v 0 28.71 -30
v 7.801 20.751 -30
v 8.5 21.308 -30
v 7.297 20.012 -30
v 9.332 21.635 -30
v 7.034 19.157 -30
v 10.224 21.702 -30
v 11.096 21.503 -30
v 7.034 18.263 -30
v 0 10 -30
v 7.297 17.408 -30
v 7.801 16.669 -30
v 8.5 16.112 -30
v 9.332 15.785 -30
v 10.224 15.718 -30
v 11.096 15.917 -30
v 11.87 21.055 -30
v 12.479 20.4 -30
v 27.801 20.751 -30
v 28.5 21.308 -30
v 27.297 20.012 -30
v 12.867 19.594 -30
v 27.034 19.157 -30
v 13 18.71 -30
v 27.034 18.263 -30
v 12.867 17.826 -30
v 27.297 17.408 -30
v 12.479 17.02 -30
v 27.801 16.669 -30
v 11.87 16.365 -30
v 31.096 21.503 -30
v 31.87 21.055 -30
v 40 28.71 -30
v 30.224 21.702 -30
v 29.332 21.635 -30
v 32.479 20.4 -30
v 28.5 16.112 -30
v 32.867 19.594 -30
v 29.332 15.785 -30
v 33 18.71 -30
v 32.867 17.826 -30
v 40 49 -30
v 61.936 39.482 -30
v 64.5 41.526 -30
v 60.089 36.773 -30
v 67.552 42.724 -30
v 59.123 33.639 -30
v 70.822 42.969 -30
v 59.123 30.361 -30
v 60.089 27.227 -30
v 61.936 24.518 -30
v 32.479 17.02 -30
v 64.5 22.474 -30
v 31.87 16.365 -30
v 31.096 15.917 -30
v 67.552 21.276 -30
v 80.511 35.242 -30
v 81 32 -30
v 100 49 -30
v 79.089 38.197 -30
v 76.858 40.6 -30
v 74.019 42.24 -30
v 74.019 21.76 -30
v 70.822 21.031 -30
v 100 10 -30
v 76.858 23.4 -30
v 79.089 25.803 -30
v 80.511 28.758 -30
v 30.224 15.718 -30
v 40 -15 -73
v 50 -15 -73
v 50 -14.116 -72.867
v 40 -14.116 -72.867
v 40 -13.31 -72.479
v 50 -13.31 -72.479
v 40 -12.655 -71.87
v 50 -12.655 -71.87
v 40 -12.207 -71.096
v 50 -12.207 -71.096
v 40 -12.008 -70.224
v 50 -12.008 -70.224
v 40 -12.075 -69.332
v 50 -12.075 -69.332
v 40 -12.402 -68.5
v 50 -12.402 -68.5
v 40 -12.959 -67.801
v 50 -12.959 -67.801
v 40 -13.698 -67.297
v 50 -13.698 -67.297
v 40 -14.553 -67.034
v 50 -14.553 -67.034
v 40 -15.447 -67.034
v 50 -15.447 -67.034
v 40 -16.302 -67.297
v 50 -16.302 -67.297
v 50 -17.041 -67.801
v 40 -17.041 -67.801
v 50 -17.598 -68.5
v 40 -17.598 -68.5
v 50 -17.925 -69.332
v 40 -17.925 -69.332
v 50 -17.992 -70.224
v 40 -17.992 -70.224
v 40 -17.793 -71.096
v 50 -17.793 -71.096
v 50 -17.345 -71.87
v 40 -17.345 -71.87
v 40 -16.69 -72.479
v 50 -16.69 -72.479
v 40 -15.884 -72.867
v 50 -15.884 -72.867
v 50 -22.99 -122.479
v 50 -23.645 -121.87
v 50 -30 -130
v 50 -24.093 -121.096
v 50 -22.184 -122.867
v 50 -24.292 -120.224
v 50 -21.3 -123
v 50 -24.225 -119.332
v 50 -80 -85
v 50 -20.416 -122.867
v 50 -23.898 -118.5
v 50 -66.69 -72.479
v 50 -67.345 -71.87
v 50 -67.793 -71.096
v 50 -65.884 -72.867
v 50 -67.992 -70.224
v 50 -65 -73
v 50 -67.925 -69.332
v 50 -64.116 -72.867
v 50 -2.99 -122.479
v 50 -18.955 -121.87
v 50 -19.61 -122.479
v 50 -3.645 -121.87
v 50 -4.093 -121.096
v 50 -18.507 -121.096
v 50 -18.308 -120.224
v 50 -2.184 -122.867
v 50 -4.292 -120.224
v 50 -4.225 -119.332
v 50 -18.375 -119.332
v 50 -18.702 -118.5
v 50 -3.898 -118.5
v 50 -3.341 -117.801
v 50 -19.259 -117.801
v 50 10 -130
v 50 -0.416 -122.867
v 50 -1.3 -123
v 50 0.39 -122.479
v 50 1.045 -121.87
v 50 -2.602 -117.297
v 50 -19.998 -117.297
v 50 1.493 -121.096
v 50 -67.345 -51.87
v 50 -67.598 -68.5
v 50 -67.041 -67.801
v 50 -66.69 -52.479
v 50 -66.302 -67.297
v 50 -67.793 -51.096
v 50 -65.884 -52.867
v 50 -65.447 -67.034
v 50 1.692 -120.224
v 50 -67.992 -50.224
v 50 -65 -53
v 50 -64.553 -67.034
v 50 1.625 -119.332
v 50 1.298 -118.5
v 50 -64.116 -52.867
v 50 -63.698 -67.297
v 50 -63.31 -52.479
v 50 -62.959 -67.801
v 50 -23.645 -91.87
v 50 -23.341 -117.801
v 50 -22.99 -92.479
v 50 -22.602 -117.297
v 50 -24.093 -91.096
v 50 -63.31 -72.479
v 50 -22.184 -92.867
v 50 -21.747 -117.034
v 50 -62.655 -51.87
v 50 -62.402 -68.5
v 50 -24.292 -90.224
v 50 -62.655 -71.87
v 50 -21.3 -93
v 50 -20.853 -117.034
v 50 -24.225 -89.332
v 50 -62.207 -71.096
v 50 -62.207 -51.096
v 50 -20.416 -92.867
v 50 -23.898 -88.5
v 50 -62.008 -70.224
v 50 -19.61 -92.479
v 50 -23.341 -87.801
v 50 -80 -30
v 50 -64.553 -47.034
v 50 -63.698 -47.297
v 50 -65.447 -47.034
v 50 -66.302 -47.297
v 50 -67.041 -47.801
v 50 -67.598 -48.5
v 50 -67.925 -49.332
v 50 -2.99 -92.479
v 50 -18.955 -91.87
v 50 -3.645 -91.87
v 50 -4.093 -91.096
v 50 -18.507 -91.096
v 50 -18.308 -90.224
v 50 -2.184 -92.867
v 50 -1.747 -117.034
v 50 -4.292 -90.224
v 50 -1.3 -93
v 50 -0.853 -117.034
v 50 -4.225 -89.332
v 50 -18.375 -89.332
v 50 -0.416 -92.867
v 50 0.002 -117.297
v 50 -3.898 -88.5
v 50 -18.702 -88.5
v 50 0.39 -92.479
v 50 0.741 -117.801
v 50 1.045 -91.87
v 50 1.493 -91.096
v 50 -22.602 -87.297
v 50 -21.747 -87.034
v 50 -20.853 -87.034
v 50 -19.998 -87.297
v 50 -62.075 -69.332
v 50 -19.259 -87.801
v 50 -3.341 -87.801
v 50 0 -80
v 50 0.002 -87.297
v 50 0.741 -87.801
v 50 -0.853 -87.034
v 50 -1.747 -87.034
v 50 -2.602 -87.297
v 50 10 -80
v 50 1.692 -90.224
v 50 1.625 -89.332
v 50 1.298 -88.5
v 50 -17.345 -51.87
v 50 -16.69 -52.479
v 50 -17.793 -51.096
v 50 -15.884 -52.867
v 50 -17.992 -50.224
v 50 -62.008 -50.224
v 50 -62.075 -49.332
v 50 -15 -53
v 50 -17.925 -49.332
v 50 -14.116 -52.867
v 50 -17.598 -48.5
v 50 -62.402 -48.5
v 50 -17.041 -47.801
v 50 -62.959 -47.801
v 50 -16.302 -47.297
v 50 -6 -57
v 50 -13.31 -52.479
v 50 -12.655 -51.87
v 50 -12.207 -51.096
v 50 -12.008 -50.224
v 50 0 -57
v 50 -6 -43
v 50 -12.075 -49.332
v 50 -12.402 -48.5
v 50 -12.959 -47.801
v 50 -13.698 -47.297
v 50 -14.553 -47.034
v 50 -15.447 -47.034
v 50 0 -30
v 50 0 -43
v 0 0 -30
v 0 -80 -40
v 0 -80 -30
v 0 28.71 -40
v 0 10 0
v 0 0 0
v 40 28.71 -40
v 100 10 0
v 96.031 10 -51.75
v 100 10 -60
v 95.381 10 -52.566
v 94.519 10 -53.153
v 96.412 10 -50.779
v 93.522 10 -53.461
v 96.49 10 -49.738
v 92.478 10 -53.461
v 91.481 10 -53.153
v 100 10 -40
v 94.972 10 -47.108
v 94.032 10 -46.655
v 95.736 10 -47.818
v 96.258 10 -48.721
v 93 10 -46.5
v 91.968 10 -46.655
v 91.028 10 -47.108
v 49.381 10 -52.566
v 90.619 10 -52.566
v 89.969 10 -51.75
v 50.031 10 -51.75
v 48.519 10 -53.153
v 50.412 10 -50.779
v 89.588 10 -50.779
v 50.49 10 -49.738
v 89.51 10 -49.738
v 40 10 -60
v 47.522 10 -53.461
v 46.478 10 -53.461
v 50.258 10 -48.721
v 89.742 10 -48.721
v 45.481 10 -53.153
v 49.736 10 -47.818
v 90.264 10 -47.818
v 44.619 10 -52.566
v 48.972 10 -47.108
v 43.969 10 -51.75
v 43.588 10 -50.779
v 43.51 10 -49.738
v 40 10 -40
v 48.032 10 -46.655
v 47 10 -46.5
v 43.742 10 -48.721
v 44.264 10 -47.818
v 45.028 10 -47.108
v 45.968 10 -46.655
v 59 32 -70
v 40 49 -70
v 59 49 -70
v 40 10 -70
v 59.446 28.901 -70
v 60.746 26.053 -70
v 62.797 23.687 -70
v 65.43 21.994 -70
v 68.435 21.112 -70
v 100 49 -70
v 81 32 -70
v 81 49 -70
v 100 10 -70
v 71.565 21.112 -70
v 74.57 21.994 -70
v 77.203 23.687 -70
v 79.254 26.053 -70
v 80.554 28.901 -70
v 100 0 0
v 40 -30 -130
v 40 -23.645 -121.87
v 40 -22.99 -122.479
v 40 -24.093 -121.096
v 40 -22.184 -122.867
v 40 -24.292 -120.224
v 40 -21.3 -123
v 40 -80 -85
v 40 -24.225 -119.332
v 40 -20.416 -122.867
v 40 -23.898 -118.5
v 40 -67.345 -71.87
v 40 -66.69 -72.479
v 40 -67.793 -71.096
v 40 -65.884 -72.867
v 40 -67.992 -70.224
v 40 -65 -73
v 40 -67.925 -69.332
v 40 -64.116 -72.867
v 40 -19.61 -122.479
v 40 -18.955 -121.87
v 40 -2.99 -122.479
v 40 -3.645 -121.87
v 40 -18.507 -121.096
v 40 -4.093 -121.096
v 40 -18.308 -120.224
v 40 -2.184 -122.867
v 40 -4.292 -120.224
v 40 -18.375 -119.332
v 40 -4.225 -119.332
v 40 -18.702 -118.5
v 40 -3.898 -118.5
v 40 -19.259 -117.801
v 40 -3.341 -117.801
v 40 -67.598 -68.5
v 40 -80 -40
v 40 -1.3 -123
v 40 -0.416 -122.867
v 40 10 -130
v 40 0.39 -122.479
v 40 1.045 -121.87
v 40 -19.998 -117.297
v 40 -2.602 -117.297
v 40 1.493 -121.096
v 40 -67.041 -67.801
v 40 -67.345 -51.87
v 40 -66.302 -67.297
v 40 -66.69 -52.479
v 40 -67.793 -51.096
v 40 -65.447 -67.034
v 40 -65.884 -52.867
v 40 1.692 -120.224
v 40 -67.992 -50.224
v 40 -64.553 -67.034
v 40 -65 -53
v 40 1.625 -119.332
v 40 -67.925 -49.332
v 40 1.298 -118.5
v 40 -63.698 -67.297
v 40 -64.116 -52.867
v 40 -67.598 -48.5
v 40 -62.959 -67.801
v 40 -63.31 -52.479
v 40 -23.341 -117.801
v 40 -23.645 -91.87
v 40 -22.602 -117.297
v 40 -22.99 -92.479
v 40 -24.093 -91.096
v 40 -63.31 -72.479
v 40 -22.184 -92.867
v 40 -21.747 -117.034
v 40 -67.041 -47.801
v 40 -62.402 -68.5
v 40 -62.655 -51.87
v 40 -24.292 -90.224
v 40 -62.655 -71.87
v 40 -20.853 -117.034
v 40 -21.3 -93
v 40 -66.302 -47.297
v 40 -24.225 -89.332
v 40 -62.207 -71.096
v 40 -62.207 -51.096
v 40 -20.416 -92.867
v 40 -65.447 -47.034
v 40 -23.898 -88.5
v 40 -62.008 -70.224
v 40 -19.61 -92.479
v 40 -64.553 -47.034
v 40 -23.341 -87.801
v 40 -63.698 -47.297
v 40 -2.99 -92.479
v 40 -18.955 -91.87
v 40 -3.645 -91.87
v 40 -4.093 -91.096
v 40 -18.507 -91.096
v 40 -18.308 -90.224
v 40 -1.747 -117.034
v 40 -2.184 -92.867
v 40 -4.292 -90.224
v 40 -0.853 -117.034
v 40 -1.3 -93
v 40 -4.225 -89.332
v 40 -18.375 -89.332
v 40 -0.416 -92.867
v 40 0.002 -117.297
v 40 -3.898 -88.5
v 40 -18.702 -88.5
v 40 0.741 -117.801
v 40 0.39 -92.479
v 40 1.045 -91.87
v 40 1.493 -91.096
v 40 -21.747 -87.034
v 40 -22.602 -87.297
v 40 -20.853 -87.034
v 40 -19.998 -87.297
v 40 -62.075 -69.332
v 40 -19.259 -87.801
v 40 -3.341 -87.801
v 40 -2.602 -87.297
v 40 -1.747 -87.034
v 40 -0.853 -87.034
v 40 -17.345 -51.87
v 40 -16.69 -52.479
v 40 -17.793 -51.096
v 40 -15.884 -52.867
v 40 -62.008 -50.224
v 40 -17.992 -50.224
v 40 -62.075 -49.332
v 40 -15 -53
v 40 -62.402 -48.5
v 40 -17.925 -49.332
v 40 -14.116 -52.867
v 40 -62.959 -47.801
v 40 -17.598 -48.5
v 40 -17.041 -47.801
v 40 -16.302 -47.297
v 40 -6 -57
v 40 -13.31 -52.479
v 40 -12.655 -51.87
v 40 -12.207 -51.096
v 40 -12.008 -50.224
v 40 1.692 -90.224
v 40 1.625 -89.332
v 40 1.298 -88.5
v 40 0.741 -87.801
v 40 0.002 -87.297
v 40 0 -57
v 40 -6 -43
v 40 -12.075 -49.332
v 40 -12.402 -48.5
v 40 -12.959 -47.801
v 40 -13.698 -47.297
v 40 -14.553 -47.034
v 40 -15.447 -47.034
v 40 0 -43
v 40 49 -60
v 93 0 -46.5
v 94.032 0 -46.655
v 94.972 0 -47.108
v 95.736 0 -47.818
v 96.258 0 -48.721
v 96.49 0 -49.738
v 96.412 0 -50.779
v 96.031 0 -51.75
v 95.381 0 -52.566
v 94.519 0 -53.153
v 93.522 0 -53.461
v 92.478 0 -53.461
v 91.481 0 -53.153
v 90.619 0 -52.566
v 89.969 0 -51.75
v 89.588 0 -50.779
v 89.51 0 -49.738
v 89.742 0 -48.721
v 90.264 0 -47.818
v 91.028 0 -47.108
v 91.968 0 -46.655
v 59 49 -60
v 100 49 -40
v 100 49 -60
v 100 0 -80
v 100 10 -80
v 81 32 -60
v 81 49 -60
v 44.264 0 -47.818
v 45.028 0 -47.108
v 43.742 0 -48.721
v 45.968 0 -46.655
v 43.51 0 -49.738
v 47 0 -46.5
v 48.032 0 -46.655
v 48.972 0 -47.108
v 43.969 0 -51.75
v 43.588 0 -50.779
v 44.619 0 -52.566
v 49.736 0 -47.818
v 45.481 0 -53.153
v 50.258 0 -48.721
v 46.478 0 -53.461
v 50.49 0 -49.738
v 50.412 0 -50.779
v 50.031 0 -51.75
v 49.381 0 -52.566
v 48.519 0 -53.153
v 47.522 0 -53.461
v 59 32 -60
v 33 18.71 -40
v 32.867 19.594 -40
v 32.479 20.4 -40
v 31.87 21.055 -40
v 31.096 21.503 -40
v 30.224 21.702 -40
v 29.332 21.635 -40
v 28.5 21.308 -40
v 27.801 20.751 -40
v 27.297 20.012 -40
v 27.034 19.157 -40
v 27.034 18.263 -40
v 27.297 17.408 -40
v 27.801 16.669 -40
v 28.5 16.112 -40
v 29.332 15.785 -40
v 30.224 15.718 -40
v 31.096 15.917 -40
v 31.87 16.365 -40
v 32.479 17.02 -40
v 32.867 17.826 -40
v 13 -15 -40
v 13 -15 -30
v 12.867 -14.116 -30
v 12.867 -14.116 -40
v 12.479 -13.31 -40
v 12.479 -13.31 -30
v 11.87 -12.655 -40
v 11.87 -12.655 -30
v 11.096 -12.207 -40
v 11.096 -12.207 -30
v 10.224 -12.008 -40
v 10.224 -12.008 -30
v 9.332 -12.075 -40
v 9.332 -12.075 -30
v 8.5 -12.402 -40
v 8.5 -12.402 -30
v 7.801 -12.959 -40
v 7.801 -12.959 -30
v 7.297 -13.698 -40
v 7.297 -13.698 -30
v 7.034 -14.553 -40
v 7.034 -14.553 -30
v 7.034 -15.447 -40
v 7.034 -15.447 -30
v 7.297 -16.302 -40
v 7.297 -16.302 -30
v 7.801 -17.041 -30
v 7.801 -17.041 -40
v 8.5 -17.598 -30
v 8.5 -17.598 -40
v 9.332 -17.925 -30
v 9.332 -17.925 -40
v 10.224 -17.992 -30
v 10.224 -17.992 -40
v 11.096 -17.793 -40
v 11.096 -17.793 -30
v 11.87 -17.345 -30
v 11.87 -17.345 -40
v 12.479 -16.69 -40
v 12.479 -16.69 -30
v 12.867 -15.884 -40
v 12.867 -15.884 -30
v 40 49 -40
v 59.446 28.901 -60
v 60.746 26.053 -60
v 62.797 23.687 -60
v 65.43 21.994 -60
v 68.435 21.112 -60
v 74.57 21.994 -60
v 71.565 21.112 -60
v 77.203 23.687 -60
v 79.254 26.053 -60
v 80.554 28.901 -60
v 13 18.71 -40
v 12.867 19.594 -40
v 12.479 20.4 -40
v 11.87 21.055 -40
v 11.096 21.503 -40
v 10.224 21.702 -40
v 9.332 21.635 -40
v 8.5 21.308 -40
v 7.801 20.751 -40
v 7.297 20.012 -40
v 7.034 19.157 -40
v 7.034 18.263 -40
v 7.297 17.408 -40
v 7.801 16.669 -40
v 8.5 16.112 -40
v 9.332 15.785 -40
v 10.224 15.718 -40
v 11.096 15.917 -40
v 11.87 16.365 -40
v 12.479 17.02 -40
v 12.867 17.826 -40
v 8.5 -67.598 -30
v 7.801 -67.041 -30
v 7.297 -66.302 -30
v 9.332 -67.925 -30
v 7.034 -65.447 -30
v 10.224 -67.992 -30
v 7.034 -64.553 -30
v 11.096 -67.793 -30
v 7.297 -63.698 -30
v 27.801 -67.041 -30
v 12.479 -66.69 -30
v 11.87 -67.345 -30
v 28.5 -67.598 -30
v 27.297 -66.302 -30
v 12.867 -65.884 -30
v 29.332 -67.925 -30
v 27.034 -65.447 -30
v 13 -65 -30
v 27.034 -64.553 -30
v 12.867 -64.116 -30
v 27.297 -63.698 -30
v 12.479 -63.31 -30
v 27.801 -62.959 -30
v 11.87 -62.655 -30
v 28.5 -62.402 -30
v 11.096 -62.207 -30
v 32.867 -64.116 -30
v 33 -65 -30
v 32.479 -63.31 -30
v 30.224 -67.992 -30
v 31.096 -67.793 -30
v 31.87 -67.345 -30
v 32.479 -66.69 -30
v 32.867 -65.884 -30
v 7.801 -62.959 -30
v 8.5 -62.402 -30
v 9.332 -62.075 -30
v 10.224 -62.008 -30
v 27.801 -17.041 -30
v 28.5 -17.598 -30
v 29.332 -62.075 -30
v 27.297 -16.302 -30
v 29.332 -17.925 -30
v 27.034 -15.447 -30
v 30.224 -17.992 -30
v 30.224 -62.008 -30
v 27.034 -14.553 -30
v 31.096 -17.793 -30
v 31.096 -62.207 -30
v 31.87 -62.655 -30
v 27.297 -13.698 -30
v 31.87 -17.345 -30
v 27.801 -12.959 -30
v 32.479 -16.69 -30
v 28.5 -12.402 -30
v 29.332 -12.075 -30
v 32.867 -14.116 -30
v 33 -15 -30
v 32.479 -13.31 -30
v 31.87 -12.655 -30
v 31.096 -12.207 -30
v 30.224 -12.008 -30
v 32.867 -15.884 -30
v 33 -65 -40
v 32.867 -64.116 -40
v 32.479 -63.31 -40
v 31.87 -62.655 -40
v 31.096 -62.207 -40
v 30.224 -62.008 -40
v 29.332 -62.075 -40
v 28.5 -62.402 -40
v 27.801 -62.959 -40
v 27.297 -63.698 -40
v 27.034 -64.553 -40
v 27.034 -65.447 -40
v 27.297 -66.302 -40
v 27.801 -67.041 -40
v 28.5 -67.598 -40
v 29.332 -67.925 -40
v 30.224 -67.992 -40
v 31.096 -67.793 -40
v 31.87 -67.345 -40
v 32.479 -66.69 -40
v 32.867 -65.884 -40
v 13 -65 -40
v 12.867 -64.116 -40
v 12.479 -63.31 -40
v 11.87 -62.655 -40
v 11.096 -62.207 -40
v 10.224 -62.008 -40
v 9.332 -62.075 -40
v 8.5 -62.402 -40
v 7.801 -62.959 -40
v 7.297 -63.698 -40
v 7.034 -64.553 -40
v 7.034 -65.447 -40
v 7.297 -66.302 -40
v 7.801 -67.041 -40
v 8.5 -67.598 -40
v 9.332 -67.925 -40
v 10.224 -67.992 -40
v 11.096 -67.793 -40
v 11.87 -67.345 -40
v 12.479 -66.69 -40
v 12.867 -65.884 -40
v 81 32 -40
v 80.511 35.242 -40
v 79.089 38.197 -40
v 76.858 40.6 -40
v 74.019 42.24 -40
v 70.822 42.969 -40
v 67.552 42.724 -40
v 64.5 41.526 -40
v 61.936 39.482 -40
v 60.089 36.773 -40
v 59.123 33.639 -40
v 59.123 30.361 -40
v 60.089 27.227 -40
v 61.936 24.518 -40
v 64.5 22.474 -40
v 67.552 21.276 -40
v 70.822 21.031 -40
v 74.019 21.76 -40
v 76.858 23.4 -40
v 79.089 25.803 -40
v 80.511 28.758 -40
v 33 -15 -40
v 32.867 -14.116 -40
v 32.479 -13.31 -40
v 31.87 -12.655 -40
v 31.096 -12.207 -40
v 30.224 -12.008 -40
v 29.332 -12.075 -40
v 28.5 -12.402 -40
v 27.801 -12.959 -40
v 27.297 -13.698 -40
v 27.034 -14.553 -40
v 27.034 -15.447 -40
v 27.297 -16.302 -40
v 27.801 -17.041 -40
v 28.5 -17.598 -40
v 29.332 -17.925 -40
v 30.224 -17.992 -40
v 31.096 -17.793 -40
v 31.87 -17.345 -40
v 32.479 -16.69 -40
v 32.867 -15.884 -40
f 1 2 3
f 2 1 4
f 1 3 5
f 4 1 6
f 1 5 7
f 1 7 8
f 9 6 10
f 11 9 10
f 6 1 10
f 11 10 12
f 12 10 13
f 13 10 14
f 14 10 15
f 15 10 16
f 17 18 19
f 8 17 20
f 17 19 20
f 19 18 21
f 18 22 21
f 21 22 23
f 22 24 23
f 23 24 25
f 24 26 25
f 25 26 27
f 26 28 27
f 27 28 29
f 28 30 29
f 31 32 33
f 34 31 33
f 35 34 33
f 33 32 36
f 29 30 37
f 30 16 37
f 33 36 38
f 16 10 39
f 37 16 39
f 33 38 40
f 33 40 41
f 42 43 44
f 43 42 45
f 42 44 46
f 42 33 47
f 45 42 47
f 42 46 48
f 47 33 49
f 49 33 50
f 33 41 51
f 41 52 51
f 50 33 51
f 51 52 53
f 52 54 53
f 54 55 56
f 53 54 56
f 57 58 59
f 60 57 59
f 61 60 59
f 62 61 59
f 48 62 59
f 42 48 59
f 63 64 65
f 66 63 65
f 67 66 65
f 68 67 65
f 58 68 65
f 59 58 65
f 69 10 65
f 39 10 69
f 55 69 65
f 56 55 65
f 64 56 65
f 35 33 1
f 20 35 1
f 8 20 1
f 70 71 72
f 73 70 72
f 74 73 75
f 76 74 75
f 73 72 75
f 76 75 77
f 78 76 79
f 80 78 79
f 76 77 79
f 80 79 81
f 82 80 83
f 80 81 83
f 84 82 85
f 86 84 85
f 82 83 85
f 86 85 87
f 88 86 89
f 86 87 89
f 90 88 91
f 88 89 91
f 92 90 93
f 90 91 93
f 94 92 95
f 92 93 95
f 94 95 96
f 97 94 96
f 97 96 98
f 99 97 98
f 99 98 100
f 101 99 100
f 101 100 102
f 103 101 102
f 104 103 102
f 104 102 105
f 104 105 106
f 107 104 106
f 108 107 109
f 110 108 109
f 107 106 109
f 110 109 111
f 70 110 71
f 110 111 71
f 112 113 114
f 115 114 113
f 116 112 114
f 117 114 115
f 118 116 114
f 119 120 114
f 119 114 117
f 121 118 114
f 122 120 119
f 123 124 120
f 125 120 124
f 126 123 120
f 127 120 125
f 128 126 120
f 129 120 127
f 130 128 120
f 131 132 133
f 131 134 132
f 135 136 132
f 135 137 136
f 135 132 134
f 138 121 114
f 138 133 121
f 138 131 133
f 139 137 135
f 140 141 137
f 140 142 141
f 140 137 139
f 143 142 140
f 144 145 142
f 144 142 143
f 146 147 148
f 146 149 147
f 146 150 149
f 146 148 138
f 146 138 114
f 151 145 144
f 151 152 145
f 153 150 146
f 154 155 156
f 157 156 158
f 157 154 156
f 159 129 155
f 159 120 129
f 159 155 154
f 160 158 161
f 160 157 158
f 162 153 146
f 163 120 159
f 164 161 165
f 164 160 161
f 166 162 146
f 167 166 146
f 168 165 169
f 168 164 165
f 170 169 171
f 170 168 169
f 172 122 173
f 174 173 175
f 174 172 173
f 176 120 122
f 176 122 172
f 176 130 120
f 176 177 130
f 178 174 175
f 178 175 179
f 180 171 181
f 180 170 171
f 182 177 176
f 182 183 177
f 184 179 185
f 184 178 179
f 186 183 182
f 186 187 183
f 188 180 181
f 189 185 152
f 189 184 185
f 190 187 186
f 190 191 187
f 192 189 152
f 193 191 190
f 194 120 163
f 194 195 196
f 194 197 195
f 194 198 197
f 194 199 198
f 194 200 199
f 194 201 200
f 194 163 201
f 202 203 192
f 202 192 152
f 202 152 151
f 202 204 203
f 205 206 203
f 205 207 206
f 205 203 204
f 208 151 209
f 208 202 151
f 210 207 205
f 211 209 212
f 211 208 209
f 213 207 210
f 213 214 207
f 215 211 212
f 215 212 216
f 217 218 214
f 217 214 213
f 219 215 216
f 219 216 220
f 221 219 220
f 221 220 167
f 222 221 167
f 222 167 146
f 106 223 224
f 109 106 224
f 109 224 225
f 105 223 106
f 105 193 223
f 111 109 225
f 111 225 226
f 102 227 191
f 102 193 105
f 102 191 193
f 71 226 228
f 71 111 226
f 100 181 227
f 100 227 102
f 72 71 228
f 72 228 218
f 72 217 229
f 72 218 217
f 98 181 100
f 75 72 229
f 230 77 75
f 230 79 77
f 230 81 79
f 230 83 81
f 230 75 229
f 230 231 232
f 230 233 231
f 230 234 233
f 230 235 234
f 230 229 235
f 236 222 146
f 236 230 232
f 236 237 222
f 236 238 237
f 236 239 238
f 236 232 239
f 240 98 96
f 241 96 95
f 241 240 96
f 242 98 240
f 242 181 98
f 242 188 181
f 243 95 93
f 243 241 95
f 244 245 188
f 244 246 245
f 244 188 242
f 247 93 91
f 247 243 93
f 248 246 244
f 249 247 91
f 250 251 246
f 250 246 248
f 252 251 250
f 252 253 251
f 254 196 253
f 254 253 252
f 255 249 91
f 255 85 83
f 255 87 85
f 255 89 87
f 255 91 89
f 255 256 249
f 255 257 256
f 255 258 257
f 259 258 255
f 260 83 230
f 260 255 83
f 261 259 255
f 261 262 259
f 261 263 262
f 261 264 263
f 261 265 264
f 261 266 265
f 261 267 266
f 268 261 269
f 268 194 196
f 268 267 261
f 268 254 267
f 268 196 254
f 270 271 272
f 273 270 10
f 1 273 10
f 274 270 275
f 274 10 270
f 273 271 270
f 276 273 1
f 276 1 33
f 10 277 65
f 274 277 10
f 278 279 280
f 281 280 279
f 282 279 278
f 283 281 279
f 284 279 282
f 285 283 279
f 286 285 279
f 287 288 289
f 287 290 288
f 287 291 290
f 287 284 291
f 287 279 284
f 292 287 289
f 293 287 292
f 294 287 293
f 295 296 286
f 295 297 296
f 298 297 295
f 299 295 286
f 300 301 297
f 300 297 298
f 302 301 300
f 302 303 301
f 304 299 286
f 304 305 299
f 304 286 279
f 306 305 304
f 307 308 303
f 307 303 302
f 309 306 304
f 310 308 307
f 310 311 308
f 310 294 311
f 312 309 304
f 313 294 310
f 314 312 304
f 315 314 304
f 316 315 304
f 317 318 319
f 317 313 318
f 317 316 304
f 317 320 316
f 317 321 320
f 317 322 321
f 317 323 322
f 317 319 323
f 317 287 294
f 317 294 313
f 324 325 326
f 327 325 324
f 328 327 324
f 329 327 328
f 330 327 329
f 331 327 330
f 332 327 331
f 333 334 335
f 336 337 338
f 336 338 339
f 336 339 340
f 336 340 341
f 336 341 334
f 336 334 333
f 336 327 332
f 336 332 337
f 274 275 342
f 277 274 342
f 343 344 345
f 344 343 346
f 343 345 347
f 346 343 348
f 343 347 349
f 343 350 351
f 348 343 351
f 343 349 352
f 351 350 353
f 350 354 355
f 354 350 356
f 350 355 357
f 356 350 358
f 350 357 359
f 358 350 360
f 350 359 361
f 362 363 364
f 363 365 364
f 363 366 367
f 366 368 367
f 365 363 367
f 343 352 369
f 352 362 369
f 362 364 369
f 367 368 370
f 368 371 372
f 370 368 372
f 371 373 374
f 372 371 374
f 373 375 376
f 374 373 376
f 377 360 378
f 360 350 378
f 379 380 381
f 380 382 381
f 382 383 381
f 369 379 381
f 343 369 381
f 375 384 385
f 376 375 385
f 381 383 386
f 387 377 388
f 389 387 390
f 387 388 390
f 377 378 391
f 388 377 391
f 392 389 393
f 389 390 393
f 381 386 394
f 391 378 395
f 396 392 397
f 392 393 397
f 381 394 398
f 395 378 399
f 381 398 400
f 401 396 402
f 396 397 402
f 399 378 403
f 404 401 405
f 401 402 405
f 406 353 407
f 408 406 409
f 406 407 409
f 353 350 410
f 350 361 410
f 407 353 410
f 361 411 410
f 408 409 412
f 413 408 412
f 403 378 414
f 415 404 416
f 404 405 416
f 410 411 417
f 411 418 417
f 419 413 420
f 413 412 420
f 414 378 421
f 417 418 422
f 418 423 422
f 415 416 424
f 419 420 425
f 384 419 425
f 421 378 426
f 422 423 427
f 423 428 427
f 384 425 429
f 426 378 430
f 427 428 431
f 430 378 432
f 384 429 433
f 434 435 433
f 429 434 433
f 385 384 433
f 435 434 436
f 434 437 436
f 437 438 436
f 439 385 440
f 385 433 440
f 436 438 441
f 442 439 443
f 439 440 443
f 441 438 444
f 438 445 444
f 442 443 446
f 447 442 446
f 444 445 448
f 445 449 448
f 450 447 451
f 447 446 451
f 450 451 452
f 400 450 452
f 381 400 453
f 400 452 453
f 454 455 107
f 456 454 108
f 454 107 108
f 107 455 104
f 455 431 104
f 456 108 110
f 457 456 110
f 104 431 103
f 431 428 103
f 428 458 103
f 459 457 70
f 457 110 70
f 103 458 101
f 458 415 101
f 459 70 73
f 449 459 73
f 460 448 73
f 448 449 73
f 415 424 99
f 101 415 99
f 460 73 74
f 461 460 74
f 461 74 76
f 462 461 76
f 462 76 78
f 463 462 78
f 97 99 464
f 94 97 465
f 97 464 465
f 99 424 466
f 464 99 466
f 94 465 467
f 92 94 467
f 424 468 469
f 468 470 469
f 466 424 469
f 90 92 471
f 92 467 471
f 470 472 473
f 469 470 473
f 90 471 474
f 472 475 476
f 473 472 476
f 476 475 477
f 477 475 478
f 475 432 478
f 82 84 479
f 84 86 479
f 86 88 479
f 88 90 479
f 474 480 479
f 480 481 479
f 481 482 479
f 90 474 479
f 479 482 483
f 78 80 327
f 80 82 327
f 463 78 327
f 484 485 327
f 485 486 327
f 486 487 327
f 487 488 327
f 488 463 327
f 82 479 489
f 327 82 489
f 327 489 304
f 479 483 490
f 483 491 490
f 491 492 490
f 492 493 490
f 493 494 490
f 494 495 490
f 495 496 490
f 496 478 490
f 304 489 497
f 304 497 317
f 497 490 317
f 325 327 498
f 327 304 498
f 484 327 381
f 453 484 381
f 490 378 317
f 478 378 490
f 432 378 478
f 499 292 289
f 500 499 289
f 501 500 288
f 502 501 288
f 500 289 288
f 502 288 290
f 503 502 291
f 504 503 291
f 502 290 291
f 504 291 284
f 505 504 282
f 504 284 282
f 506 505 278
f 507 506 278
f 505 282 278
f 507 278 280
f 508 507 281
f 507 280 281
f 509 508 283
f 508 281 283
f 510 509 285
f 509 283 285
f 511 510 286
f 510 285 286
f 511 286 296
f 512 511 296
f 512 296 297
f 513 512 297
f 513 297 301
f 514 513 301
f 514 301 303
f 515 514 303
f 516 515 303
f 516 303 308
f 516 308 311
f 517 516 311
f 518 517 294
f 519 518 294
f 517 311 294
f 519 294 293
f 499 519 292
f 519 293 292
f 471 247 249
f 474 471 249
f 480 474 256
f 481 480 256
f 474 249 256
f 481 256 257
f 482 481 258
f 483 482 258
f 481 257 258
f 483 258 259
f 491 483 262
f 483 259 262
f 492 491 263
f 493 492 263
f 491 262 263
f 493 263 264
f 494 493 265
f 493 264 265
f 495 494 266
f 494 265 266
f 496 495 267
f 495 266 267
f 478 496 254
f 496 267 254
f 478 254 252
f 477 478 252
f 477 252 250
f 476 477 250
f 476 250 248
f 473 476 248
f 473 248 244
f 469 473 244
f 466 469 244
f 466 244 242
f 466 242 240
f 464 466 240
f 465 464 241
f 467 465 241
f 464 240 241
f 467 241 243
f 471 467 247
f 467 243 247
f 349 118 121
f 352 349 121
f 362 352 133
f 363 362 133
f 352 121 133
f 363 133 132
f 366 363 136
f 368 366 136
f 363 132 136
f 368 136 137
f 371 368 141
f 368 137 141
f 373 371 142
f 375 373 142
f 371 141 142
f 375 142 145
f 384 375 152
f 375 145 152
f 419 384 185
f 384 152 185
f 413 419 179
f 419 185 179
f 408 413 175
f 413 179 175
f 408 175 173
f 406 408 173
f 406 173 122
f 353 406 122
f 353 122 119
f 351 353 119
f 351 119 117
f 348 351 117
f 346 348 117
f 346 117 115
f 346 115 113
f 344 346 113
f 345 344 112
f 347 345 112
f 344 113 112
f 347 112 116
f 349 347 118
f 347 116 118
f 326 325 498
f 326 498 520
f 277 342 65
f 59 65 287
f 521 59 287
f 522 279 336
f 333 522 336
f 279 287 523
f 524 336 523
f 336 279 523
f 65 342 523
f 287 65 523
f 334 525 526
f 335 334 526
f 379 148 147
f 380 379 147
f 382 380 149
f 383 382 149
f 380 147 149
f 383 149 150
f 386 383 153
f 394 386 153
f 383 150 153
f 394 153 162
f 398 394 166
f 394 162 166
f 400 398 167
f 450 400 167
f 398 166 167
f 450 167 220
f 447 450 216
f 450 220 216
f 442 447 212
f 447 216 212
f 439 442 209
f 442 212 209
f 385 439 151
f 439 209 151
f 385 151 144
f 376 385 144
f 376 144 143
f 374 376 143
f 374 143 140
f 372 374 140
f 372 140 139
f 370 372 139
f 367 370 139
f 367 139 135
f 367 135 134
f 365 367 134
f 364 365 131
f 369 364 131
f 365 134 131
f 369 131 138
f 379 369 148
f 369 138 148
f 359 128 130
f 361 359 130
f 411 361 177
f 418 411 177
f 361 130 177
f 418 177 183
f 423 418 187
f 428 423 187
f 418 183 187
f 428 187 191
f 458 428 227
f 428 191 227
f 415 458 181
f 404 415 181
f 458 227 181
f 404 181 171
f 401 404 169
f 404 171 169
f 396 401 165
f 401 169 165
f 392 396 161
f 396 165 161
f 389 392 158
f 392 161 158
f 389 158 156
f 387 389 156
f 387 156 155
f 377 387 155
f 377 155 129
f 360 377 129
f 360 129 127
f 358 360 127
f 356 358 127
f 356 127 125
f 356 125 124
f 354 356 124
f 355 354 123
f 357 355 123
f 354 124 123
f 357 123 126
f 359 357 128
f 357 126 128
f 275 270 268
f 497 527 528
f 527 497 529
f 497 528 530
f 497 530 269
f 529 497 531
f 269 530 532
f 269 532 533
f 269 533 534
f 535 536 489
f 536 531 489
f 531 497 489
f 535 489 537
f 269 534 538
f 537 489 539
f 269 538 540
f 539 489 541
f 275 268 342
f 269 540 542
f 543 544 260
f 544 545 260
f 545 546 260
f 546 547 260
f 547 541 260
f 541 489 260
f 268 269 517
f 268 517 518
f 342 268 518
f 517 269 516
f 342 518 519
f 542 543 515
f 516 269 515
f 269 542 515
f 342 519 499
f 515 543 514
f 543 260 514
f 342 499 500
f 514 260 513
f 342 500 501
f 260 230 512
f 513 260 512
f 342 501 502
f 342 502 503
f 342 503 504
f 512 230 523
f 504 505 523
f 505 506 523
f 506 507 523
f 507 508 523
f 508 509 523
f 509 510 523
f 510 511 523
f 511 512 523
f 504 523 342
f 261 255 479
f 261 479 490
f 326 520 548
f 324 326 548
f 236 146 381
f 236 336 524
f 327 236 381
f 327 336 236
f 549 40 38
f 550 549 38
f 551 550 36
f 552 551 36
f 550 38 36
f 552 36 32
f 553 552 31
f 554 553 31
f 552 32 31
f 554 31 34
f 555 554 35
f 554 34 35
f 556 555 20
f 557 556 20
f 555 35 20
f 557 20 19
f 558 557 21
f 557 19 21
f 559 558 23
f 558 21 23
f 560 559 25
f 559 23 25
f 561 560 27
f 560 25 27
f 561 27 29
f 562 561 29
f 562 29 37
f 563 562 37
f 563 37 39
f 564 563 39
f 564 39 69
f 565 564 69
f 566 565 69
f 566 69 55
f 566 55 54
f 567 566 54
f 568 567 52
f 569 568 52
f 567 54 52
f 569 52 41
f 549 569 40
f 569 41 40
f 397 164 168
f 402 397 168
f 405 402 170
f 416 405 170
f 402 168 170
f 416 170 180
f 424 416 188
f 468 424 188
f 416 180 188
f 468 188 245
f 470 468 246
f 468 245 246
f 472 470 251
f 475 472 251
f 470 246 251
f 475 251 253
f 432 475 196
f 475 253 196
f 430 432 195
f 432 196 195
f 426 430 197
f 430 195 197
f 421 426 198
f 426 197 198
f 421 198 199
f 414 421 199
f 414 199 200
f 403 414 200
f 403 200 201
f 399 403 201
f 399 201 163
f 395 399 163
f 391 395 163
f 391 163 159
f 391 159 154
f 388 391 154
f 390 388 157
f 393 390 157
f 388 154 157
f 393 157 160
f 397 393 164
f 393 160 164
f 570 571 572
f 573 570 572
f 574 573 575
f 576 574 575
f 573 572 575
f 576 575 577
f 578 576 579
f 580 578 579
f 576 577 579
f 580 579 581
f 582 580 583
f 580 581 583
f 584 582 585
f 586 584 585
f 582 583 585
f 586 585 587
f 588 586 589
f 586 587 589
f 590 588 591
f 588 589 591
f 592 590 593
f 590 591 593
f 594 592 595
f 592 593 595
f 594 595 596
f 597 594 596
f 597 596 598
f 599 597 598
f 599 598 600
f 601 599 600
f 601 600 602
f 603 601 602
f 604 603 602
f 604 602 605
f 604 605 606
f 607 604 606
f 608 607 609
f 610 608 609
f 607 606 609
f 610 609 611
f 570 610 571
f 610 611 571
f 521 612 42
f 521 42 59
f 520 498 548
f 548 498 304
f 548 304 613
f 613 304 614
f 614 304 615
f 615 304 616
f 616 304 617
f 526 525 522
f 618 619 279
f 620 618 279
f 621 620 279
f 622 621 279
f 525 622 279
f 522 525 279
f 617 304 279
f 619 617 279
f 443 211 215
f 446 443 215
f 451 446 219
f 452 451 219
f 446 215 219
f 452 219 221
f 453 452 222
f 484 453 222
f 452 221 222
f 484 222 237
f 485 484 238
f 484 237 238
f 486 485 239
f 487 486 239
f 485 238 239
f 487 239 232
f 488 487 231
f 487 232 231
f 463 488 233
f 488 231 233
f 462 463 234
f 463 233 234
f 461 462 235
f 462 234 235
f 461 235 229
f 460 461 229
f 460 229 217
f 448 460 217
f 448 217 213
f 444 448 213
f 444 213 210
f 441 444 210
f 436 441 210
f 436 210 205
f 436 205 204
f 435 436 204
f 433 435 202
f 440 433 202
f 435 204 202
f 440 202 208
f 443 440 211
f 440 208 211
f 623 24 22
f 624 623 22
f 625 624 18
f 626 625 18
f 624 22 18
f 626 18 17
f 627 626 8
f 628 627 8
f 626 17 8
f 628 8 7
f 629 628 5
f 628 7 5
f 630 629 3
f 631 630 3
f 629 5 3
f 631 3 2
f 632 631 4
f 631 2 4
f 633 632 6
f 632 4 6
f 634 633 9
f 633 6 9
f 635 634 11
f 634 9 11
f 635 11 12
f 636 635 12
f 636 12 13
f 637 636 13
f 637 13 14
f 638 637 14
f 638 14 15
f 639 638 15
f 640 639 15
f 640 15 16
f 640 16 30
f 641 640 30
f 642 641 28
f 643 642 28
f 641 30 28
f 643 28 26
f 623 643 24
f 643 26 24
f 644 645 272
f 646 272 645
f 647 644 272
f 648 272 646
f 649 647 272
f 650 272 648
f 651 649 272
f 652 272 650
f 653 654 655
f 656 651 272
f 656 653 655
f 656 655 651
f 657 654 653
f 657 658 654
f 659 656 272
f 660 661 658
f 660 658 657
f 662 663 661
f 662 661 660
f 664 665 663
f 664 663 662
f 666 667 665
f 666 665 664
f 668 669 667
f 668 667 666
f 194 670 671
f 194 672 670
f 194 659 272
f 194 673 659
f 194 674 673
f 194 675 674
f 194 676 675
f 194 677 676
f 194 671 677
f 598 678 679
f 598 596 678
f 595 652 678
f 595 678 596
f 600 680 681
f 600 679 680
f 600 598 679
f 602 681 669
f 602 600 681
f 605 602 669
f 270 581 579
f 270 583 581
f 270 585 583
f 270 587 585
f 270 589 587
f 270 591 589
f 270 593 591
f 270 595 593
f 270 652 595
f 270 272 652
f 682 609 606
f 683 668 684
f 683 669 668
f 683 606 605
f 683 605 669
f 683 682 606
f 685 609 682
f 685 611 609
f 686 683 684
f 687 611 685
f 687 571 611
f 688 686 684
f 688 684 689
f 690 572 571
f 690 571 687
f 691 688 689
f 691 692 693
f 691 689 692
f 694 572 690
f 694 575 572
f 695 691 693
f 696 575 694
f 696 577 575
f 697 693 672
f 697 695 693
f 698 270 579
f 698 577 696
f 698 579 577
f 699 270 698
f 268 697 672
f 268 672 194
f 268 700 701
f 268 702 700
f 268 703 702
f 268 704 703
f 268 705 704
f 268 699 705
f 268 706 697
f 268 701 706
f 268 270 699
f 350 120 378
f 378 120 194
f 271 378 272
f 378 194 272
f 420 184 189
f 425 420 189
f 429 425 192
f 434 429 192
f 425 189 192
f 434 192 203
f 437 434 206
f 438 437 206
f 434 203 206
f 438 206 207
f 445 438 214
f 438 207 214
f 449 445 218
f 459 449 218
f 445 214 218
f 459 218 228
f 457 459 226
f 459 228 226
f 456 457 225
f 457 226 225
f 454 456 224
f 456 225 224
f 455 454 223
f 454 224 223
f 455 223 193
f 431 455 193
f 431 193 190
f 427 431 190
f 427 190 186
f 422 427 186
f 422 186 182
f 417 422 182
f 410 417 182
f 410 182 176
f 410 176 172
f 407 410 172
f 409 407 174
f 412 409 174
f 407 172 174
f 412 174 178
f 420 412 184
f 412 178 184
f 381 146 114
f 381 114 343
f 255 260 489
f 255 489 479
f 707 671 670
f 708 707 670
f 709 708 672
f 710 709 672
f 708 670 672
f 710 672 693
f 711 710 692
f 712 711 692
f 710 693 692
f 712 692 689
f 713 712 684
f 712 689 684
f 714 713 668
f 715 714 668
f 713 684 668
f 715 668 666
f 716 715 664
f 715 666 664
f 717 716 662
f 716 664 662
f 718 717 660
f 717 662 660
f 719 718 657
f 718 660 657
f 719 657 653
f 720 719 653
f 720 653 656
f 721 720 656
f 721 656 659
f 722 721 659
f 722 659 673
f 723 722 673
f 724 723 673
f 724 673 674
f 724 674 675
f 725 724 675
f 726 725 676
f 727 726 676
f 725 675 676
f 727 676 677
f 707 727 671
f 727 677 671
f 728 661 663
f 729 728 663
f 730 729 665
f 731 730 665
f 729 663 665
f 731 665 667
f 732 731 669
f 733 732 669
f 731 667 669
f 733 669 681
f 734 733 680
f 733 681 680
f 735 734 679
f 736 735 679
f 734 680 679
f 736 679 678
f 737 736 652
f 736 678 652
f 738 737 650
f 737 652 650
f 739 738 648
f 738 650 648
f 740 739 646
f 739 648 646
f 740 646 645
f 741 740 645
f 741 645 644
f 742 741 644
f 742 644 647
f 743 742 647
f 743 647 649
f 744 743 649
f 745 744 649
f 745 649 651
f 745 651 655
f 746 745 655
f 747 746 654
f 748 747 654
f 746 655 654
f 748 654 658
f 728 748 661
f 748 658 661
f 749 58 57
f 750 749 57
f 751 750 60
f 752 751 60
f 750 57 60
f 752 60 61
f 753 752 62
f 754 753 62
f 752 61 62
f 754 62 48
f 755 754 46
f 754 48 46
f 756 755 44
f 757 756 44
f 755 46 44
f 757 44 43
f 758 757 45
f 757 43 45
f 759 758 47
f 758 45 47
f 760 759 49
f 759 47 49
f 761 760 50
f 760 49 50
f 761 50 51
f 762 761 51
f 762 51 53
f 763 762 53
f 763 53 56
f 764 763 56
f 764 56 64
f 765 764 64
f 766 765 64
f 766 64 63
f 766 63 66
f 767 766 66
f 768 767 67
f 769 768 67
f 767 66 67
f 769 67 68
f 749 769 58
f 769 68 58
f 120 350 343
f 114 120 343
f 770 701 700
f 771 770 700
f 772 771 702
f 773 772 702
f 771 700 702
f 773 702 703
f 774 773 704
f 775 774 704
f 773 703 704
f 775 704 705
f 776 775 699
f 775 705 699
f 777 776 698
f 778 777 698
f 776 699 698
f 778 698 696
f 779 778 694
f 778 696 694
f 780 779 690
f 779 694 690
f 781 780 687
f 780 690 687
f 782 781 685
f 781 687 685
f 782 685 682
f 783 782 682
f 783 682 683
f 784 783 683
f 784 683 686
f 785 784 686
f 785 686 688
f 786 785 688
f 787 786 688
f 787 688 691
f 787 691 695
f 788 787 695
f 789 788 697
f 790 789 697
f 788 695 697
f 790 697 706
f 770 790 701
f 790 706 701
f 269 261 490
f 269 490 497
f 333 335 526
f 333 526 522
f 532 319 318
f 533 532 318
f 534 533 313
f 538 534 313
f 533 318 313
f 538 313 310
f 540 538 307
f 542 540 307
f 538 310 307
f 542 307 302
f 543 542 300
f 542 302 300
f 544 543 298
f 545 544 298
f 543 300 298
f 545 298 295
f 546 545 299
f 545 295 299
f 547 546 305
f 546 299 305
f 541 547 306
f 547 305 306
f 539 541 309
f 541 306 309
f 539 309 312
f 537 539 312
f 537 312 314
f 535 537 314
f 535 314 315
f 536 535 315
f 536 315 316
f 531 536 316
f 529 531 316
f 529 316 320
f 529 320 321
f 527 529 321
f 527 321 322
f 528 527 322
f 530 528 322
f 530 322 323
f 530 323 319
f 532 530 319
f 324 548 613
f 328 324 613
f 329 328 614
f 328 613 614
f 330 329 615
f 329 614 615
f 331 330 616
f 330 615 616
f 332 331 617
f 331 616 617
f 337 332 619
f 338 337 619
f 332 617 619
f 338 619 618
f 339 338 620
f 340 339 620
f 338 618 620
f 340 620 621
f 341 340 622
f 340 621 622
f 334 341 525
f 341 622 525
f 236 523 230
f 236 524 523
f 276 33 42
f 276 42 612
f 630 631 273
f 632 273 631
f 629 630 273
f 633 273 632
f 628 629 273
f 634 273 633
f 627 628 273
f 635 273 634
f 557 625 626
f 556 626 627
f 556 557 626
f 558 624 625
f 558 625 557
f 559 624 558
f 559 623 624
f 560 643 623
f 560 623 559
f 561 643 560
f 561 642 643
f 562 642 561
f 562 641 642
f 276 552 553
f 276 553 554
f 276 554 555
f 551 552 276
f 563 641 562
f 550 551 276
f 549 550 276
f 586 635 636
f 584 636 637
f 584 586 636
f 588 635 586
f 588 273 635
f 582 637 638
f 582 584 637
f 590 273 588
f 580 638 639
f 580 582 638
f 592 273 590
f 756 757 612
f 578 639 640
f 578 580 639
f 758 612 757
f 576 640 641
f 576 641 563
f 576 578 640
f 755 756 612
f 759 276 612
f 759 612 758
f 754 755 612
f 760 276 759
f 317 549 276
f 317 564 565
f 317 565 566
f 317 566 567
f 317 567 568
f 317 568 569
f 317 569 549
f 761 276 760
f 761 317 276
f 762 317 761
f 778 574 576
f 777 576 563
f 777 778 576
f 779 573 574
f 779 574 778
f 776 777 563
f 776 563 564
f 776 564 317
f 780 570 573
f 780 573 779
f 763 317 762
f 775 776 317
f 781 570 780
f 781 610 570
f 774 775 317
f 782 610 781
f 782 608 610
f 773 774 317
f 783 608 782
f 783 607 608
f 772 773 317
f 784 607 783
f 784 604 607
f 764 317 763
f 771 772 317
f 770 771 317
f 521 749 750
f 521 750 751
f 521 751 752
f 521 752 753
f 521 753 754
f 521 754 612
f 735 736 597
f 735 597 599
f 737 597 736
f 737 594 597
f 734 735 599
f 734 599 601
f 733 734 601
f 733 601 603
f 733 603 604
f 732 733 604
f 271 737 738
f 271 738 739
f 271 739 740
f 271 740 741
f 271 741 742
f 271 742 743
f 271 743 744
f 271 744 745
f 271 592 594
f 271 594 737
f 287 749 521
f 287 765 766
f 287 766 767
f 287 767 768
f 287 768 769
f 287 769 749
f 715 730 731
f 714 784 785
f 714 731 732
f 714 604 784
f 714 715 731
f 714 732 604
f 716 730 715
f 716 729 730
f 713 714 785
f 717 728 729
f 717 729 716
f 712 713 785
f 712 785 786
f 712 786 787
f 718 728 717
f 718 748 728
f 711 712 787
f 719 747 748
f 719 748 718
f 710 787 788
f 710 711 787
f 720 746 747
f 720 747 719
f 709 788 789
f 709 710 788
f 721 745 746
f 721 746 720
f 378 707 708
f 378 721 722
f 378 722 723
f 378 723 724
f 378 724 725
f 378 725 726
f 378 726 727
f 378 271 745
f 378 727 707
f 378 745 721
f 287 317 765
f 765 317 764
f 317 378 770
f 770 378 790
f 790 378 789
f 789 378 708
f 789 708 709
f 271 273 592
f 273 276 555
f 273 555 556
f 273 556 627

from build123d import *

# Parameters (mm, degrees)
BOSS_EXTRUDE1_DEPTH = 10
SKETCH2_W           = 40
SKETCH2_H           = 10
BOSS_EXTRUDE2_DEPTH = 18.71
BOSS_EXTRUDE3_DEPTH = 80
SKETCH5_W           = 10
SKETCH5_H           = 90
BOSS_EXTRUDE4_DEPTH = 50
CUT_EXTRUDE1_DEPTH  = 10
SKETCH7_W           = 60
SKETCH7_H           = 10
BOSS_EXTRUDE5_DEPTH = 39
SKETCH8_R           = 3.5
CUT_EXTRUDE2_DEPTH  = 10
CUT_EXTRUDE3_DEPTH  = 10
SKETCH10_R          = 11
SKETCH10_R_2        = 3
CUT_EXTRUDE4_DEPTH  = 10
SKETCH11_R          = 3
CUT_EXTRUDE5_DEPTH  = 10
CUT_EXTRUDE6_START  = -10
CUT_EXTRUDE6_DEPTH  = 10


with BuildPart() as part:
    # Sketch1 → Boss-Extrude1 (new body)
    with BuildSketch(Plane(origin=(0, 0, 0), x_dir=(1, 0, 0), z_dir=(0, 1, 0))):
        Polygon((0, 0), (100, 0), (100, 80), (40, 80), (40, 40), (0, 40), align=None)
    extrude(amount=BOSS_EXTRUDE1_DEPTH)

    # Sketch2 → Boss-Extrude2 (add)
    with BuildSketch(Plane(origin=(0, 10, 0), x_dir=(1, 0, 0), z_dir=(0, 1, 0))):
        with Locations((20, 35)):
            Rectangle(SKETCH2_W, SKETCH2_H)
    extrude(amount=BOSS_EXTRUDE2_DEPTH)

    # Sketch3 → Boss-Extrude3 (add)
    with BuildSketch(Plane.XZ):
        Polygon((0, -30), (50, -30), (50, -80), (40, -80), (40, -40), (0, -40), align=None)
    extrude(amount=BOSS_EXTRUDE3_DEPTH)

    # Sketch5 → Boss-Extrude4 (add)
    with BuildSketch(Plane(origin=(0, 0, -80), x_dir=(-1, 0, 0), z_dir=(0, 0, -1))):
        with Locations((-45, -35)):
            Rectangle(SKETCH5_W, SKETCH5_H)
    extrude(amount=BOSS_EXTRUDE4_DEPTH)

    # Sketch6 → Cut-Extrude1 (cut)
    with BuildSketch(Plane.ZY.offset(-40)):
        Polygon((-85, -80), (-130, -30), (-130, -80), align=None)
    extrude(amount=-CUT_EXTRUDE1_DEPTH, mode=Mode.SUBTRACT)

    # Sketch7 → Boss-Extrude5 (add)
    with BuildSketch(Plane(origin=(0, 10, 0), x_dir=(1, 0, 0), z_dir=(0, 1, 0))):
        with Locations((70, 65)):
            Rectangle(SKETCH7_W, SKETCH7_H)
        with Locations((70, 35)):
            Rectangle(SKETCH7_W, SKETCH7_H)
    extrude(amount=BOSS_EXTRUDE5_DEPTH)

    # Sketch8 → Cut-Extrude2 (cut)
    with BuildSketch(Plane(origin=(0, 10, 0), x_dir=(1, 0, 0), z_dir=(0, 1, 0))):
        with Locations(Location((47, 50, 0), (0, 0, 270))):
            Circle(SKETCH8_R)
        with Locations(Location((93, 50, 0), (0, 0, 270))):
            Circle(SKETCH8_R)
    extrude(amount=-CUT_EXTRUDE2_DEPTH, mode=Mode.SUBTRACT)

    # Sketch9 → Cut-Extrude3 (cut)
    with BuildSketch(Plane(origin=(50, 0, 0), x_dir=(0, 0, -1), z_dir=(1, 0, 0))):
        Polygon((50, 0), (57, 0), (57, -6), (43, -6), (43, 0), align=None)
    extrude(amount=-CUT_EXTRUDE3_DEPTH, mode=Mode.SUBTRACT)

    # Sketch10 → Cut-Extrude4 (cut)
    with BuildSketch(Plane.XY.offset(-30)):
        with Locations((70, 32)):
            Circle(SKETCH10_R)
        with Locations((30, 18.71)):
            Circle(SKETCH10_R_2)
        with Locations((10, 18.71)):
            Circle(SKETCH10_R_2)
        with Locations((30, -15)):
            Circle(SKETCH10_R_2)
        with Locations((10, -15)):
            Circle(SKETCH10_R_2)
        with Locations((30, -65)):
            Circle(SKETCH10_R_2)
        with Locations((10, -65)):
            Circle(SKETCH10_R_2)
    extrude(amount=-CUT_EXTRUDE4_DEPTH, mode=Mode.SUBTRACT)

    # Sketch11 → Cut-Extrude5 (cut)
    with BuildSketch(Plane(origin=(50, 0, 0), x_dir=(0, 0, -1), z_dir=(1, 0, 0))):
        with Locations((50, -15)):
            Circle(SKETCH11_R)
        with Locations((70, -15)):
            Circle(SKETCH11_R)
        with Locations((70, -65)):
            Circle(SKETCH11_R)
        with Locations((50, -65)):
            Circle(SKETCH11_R)
        with Locations((90, -1.3)):
            Circle(SKETCH11_R)
        with Locations((120, -1.3)):
            Circle(SKETCH11_R)
        with Locations((90, -21.3)):
            Circle(SKETCH11_R)
        with Locations((120, -21.3)):
            Circle(SKETCH11_R)
    extrude(amount=-CUT_EXTRUDE5_DEPTH, mode=Mode.SUBTRACT)

    # Sketch12 → Cut-Extrude6 (cut)
    with BuildSketch(Plane(origin=(0, 0, -70), x_dir=(-1, 0, 0), z_dir=(0, 0, -1)).offset(CUT_EXTRUDE6_START)):
        with BuildLine():
            Line((-70, 49), (-59, 49))
            Line((-59, 49), (-59, 32))
            ThreePointArc((-59, 32), (-70, 21), (-81, 32))
            Line((-81, 32), (-81, 49))
            Line((-81, 49), (-70, 49))
        make_face()
    extrude(amount=CUT_EXTRUDE6_DEPTH, mode=Mode.SUBTRACT)


solid = part.part
